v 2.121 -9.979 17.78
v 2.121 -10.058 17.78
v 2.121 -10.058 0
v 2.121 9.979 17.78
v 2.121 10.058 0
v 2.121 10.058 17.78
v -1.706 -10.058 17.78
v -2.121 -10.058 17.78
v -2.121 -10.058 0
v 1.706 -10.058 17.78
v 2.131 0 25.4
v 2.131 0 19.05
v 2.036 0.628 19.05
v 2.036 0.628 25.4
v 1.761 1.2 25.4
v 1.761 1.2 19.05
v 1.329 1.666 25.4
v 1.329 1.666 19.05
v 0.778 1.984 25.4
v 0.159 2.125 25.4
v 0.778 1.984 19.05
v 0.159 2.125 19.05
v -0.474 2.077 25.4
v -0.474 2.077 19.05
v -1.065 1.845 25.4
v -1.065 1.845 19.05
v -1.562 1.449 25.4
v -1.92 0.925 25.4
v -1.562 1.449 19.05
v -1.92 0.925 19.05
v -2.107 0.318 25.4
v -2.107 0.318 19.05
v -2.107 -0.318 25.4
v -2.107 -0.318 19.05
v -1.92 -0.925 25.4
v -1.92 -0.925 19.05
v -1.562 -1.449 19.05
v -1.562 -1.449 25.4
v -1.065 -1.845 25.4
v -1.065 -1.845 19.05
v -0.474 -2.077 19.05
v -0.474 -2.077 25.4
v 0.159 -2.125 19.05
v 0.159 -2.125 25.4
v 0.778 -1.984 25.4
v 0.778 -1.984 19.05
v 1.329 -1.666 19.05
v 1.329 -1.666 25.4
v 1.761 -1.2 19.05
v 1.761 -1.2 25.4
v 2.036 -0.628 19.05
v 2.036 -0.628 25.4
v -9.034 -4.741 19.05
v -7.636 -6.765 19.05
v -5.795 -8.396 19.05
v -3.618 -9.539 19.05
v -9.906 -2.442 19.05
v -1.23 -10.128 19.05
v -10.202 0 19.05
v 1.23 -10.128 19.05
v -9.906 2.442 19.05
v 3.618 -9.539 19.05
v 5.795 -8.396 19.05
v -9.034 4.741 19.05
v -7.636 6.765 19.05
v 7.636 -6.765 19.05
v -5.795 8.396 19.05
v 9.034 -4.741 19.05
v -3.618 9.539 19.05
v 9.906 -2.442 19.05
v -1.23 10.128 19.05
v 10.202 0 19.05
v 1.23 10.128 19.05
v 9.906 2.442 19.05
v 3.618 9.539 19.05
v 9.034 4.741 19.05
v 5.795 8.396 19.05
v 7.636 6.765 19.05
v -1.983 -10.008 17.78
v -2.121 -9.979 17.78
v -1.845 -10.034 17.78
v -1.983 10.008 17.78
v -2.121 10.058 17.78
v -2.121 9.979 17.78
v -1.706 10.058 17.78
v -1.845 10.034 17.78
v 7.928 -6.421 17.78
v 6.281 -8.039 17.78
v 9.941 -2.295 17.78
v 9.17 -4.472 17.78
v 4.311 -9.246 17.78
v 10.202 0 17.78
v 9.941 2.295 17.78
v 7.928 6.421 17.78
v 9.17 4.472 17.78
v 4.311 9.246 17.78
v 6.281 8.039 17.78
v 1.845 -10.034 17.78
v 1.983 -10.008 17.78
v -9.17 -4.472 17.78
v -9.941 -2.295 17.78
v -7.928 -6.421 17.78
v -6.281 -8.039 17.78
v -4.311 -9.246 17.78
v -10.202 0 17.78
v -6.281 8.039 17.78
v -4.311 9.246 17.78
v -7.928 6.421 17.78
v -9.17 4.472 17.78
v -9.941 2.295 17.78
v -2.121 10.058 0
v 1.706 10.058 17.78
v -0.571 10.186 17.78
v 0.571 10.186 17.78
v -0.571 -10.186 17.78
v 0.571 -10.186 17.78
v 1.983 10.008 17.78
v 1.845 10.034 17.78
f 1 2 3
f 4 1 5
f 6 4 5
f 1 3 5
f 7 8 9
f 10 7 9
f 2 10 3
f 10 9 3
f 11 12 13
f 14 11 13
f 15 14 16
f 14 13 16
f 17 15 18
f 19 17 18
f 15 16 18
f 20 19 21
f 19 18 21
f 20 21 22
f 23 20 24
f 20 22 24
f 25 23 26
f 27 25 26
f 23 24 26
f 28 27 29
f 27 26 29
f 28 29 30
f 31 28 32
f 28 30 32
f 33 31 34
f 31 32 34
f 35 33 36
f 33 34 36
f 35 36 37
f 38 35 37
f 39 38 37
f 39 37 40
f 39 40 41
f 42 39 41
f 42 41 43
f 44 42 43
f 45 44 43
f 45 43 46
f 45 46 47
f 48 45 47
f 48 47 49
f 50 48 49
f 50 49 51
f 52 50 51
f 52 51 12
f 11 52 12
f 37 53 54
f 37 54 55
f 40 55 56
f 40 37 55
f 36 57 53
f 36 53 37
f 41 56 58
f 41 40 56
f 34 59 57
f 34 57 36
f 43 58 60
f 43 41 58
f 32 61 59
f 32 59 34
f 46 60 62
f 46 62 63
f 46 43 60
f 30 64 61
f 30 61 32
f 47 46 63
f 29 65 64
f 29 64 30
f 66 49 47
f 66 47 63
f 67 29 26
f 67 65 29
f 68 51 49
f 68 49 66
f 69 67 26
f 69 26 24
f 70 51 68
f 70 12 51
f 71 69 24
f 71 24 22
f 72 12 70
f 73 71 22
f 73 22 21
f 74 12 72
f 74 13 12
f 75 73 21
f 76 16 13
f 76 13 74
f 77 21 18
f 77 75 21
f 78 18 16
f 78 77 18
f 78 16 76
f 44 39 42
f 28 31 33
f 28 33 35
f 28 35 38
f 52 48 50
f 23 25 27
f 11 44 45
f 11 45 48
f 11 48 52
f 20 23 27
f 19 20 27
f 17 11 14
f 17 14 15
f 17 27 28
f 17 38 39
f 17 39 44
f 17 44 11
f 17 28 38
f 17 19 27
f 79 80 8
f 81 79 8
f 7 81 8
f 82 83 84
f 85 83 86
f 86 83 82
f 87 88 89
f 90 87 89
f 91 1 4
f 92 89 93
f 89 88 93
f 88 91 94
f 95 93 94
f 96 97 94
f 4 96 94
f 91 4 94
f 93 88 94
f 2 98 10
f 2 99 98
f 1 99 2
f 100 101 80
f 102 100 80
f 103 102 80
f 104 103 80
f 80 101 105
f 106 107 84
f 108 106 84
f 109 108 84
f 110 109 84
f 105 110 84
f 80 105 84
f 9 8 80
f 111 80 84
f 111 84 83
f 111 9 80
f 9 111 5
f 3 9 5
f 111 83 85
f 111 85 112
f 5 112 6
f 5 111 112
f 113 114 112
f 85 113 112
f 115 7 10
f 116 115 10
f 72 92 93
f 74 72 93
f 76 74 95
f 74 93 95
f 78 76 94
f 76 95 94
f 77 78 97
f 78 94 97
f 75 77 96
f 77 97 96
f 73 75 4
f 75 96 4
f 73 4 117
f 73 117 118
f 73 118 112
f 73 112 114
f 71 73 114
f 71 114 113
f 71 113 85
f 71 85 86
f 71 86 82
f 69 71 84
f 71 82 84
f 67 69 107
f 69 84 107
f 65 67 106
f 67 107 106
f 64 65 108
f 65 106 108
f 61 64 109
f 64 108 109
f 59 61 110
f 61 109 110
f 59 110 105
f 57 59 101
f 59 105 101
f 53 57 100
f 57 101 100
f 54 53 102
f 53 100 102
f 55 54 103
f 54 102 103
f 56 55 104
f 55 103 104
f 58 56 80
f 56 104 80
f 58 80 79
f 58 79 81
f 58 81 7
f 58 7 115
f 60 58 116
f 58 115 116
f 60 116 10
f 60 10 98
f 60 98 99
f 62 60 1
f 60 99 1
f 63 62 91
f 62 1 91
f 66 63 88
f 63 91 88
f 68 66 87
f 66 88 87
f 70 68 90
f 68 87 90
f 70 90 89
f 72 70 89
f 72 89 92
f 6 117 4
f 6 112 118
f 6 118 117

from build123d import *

# Parameters (mm, degrees)
F0_W     = 4.2418
F0_H     = 20.1168
F7_DEPTH = 17.78
F1_R     = 2.130855
F2_DEPTH = 7.62
F1_R_2   = 10.202132
F3_DEPTH = 1.27


with BuildPart() as f7:
    # F0 (on Top) → F7 (new body)
    with BuildSketch(Plane.XY):
        Rectangle(F0_W, F0_H)
    extrude(amount=F7_DEPTH)

    # F1 (on offset) → F2 (join)
    with BuildSketch(Plane.XY.offset(17.78)):
        Circle(F1_R)
    extrude(amount=F2_DEPTH)

    # F1 (on offset) → F3 (join)
    with BuildSketch(Plane.XY.offset(17.78)):
        Circle(F1_R_2)
        Circle(F1_R, mode=Mode.SUBTRACT)
    extrude(amount=F3_DEPTH)


solid = f7.part
